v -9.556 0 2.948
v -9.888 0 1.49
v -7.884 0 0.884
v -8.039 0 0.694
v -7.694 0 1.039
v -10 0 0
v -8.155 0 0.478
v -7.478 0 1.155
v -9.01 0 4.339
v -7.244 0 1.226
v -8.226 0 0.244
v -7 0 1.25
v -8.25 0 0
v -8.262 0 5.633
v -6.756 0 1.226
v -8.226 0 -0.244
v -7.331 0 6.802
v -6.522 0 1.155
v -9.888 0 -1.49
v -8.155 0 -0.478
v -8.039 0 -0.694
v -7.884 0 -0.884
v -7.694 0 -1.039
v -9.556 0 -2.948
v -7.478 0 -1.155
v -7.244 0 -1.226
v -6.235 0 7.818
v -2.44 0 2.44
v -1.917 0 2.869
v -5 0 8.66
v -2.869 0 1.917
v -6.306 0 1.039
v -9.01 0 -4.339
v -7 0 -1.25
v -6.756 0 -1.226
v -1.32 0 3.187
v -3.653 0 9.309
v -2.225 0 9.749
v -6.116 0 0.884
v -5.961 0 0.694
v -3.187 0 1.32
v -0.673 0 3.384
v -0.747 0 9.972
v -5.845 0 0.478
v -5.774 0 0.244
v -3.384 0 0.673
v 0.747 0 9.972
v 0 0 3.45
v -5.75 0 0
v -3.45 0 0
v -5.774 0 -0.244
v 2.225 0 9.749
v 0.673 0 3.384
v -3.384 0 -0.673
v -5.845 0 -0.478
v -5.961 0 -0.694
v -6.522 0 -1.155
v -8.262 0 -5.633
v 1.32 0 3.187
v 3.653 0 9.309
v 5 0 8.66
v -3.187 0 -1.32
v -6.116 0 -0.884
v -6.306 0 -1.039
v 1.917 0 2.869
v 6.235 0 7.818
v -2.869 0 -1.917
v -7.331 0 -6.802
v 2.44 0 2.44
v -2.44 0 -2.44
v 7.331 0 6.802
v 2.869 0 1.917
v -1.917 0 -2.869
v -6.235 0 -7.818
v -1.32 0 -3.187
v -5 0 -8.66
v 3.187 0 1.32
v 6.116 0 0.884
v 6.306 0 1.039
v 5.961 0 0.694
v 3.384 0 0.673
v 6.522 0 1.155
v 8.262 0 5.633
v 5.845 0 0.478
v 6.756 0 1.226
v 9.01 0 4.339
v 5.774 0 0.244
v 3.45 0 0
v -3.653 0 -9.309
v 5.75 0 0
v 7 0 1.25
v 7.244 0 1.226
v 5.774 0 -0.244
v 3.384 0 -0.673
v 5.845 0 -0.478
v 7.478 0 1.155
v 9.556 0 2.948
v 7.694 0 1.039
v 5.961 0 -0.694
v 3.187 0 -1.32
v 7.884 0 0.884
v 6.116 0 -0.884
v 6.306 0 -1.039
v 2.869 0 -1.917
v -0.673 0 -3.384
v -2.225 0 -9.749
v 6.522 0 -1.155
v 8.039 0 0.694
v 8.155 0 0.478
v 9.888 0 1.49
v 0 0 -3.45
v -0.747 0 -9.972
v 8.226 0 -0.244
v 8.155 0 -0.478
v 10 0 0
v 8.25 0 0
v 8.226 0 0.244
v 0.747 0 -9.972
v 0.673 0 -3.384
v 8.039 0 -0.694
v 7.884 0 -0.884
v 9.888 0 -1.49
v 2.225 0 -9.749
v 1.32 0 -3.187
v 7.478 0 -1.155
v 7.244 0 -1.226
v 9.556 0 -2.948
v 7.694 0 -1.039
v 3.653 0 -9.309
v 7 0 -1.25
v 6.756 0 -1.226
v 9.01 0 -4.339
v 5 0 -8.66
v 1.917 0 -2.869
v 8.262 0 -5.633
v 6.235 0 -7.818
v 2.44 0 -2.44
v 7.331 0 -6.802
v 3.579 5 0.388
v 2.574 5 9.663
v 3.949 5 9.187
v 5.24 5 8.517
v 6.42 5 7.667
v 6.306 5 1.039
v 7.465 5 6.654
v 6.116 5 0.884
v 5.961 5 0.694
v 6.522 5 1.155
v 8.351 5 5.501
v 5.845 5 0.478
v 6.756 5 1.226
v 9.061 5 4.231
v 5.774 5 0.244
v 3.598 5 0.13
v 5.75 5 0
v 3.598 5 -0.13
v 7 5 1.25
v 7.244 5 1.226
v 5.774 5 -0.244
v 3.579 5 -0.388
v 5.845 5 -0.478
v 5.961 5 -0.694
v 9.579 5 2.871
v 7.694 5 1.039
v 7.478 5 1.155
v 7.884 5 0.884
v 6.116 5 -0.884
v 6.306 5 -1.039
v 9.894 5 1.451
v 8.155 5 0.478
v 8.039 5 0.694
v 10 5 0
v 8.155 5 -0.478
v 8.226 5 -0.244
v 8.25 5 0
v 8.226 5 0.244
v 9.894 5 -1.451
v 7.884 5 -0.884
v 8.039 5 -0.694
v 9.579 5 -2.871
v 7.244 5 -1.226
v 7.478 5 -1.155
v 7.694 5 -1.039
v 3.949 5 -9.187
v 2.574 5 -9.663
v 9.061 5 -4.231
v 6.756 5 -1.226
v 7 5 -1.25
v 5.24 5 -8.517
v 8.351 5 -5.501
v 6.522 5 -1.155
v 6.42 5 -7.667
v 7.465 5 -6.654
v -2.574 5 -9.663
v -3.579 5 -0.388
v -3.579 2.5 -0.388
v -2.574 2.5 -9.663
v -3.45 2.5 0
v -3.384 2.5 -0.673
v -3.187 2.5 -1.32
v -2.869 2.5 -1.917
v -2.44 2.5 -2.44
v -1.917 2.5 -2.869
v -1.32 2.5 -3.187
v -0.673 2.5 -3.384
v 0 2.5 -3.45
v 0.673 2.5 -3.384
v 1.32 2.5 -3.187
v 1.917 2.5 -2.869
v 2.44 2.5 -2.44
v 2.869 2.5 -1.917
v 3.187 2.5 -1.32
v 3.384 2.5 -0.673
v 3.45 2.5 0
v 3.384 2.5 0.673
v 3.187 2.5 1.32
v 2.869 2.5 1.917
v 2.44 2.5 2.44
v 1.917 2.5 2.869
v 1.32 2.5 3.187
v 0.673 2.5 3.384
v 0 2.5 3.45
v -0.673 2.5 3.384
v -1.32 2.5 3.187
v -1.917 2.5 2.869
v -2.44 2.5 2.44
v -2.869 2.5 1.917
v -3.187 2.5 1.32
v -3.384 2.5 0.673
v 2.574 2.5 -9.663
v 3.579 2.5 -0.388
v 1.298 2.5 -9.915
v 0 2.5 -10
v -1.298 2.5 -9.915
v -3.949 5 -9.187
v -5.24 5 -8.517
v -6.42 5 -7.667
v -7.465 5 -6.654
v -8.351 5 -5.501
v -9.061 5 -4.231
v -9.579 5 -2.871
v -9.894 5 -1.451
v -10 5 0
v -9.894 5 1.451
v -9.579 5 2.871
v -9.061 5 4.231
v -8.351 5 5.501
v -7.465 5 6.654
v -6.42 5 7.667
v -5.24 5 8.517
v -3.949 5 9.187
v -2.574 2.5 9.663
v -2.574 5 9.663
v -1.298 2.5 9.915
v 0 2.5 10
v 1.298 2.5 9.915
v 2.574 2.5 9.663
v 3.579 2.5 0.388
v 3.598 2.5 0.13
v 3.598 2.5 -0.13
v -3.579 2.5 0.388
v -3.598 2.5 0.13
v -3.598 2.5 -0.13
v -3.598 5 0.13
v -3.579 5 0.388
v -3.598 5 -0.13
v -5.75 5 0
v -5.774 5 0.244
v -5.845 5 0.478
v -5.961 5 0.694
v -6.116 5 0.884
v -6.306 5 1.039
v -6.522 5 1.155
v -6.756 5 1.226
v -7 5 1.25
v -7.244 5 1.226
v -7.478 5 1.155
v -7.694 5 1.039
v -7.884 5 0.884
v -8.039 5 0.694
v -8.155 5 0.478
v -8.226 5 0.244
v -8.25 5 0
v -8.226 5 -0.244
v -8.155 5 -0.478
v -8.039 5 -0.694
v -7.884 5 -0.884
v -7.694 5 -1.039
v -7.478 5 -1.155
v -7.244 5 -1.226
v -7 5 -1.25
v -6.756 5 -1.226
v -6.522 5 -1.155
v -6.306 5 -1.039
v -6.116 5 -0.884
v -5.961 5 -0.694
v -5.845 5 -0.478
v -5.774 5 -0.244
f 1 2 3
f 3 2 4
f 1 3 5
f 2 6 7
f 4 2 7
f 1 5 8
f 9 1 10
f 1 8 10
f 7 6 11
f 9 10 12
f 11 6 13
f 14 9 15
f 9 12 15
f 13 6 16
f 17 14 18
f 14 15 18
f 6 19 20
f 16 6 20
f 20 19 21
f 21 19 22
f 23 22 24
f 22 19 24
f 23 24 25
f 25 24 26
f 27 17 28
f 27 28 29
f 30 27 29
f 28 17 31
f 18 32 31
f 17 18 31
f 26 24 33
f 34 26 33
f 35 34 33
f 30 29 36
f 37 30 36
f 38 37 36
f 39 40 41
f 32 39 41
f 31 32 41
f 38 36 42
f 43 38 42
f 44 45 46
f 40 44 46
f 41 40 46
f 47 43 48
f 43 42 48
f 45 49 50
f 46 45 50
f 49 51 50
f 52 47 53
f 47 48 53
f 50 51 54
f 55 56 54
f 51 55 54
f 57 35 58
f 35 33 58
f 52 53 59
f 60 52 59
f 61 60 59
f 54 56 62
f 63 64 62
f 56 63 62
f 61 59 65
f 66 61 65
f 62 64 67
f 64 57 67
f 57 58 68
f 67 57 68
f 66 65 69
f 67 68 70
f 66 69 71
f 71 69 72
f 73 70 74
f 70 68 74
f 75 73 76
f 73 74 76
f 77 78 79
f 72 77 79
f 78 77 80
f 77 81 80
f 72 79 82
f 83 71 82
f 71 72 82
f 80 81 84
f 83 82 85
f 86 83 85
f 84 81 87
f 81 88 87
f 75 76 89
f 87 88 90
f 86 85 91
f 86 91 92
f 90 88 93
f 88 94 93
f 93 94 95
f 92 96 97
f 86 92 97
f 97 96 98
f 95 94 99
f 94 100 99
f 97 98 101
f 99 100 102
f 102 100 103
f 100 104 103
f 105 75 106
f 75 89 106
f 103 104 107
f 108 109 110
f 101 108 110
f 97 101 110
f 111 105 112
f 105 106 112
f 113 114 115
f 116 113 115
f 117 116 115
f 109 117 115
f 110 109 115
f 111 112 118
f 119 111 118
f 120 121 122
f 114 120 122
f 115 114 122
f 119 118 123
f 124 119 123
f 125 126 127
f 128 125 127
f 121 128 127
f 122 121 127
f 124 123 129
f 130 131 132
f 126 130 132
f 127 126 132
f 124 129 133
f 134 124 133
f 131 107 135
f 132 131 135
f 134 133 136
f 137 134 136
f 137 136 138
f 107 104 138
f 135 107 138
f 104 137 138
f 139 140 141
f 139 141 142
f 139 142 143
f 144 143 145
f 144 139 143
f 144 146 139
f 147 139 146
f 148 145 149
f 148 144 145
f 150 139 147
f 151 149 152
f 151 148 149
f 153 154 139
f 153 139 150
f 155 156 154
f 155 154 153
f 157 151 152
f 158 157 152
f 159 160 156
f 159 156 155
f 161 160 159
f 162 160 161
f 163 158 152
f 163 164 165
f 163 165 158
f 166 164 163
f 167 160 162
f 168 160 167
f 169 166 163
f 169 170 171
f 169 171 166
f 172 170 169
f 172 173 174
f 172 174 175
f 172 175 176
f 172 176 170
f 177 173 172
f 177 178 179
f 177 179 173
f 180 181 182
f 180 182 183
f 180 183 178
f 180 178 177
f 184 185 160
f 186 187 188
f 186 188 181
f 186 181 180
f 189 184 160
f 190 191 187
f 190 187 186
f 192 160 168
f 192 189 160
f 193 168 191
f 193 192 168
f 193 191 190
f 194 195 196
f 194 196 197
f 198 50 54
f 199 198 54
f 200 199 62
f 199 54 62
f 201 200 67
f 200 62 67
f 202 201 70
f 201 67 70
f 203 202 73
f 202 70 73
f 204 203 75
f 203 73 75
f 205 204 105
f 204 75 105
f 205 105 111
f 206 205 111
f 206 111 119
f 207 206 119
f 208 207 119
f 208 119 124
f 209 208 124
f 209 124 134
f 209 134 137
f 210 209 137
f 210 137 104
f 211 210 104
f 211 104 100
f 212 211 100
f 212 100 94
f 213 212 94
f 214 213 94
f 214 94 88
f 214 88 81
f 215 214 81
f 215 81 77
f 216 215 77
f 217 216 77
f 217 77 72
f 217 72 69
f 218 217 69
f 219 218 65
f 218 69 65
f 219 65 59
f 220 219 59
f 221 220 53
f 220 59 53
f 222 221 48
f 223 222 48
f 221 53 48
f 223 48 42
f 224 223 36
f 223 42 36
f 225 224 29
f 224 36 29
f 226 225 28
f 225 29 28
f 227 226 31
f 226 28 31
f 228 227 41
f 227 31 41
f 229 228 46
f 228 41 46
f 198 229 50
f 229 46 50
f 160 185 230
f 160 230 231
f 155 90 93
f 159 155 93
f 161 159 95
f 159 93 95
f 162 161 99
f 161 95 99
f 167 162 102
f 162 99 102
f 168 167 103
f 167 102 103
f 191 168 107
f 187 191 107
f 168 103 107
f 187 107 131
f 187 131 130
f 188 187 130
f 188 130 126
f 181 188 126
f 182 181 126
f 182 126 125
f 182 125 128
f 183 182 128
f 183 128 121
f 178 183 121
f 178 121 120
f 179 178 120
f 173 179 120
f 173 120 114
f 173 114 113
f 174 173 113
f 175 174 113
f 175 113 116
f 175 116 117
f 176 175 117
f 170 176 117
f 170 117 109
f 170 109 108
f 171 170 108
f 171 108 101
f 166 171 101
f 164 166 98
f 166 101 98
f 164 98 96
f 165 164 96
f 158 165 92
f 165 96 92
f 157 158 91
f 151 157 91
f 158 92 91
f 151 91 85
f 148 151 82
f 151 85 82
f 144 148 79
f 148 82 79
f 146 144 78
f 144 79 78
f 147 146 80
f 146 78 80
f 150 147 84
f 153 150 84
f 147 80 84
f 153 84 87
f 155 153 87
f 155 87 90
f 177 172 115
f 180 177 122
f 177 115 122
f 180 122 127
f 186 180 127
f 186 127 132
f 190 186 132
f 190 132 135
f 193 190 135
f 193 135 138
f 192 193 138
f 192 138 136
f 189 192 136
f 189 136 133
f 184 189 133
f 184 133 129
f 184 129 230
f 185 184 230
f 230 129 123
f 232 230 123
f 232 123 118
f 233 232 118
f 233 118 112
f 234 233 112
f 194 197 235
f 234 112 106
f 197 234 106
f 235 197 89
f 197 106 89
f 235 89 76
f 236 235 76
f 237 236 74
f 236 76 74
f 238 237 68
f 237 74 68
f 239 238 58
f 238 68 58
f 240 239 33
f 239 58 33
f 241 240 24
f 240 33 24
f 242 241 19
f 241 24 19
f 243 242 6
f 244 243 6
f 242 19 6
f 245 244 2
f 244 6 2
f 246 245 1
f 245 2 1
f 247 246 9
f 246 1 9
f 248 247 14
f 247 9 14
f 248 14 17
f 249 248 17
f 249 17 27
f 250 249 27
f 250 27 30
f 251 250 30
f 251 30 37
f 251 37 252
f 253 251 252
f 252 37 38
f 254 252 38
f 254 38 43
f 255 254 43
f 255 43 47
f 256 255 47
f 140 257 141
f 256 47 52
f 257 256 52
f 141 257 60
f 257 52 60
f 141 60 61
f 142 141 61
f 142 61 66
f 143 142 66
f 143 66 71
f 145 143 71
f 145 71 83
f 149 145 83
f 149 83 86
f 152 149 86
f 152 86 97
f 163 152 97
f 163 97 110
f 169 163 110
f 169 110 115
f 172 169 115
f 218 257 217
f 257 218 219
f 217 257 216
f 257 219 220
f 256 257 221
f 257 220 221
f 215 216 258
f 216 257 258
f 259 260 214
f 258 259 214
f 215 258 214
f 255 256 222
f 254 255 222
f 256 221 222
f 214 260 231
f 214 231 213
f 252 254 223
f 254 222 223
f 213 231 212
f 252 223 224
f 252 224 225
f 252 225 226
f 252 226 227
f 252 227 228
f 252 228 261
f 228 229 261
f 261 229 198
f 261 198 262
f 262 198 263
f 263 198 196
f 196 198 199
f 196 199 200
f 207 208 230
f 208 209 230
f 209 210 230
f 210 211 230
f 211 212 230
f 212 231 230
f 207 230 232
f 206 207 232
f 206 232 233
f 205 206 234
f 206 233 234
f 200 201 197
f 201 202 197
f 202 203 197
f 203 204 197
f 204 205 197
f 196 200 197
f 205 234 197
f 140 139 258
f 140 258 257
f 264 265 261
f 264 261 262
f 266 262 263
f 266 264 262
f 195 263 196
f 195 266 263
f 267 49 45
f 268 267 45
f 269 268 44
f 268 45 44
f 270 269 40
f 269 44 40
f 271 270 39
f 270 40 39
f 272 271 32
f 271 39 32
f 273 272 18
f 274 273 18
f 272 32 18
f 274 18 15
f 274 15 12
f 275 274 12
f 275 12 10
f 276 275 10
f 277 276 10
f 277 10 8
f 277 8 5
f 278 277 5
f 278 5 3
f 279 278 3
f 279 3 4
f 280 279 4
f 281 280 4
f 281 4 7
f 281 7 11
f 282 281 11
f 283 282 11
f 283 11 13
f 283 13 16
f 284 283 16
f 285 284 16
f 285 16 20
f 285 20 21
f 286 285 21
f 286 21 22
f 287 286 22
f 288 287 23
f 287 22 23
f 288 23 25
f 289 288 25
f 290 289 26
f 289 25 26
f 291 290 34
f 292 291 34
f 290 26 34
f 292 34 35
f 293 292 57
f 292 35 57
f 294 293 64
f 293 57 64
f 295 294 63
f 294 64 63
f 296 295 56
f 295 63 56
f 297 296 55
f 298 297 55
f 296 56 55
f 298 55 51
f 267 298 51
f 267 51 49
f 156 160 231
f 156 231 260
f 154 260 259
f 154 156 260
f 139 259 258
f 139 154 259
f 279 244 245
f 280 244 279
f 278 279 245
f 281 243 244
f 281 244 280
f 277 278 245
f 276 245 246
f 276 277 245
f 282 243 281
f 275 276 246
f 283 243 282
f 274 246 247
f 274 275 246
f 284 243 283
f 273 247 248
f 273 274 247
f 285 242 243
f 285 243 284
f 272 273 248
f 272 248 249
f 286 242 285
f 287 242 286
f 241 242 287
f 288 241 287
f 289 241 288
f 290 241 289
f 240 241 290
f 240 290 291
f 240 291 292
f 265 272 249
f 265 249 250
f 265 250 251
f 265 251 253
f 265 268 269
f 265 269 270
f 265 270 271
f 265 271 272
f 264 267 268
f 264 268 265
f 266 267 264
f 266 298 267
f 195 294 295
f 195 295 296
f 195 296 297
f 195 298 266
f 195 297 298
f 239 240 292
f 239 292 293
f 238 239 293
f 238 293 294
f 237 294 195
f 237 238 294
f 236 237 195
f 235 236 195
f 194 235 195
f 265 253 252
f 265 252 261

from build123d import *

# Parameters (mm, degrees)
SKETCH1_R                       = 10
BOSS_EXTRUDE1_DEPTH             = 5
TAP_DRILL_FOR_M3X0_5_TAP1_D     = 2.5
TAP_DRILL_FOR_M3X0_5_TAP1_DEPTH = 38.1
CIRPATTERN1_COUNT               = 4
F_14_0_182_DIAMETER_HOLE1_D     = 6.899999916
CUT_EXTRUDE3_DEPTH              = 2.5


with BuildPart() as part:
    # Sketch1 → Boss-Extrude1 (new body)
    with BuildSketch(Plane(origin=(0, 0, 0), x_dir=(1, 0, 0), z_dir=(0, 1, 0))):
        Circle(SKETCH1_R)
    extrude(amount=BOSS_EXTRUDE1_DEPTH)

    # Tap Drill for M3x0.5 Tap1
    with Locations(Plane(origin=(0, 5, 0), x_dir=(1, 0, 0), z_dir=(0, 1, 0))):
        with Locations((7, 0)):
            tap_drill_for_m3x0_5_tap1 = Hole(TAP_DRILL_FOR_M3X0_5_TAP1_D / 2, depth=TAP_DRILL_FOR_M3X0_5_TAP1_DEPTH)

    # CirPattern1: Tap Drill for M3x0.5 Tap1 ×4 about axis, 2 skipped
    cirpattern1_axis = Axis((0, 5, 0), (0, -1, 0))
    add([tap_drill_for_m3x0_5_tap1.rotate(cirpattern1_axis, i * 360 / CIRPATTERN1_COUNT) for i in range(1, CIRPATTERN1_COUNT) if i not in (1, 3)], mode=Mode.SUBTRACT)

    # #14 (0.182) Diameter Hole1 (through all)
    with Locations(Plane(origin=(0, 5, 0), x_dir=(1, 0, 0), z_dir=(0, 1, 0))):
        with Locations((0, 0)):
            Hole(F_14_0_182_DIAMETER_HOLE1_D / 2)

    # Sketch10 → Cut-Extrude3 (cut)
    with BuildSketch(Plane(origin=(0, 5, 0), x_dir=(1, 0, 0), z_dir=(0, 1, 0))):
        with BuildLine():
            Line((-3.57904225, 0.387887324), (-2.057949293, 14.423035211))
            ThreePointArc((-2.057949293, 14.423035211), (0, 16.27), (2.057949293, 14.423035211))
            Line((2.057949293, 14.423035211), (3.57904225, 0.387887324))
            ThreePointArc((3.57904225, 0.387887324), (3.6, 0), (3.57904225, -0.387887324))
            Line((3.57904225, -0.387887324), (2.057949293, -14.423035211))
            ThreePointArc((2.057949293, -14.423035211), (0, -16.27), (-2.057949293, -14.423035211))
            Line((-2.057949293, -14.423035211), (-3.57904225, -0.387887324))
            ThreePointArc((-3.57904225, -0.387887324), (-3.6, 0), (-3.57904225, 0.387887324))
        make_face()
    extrude(amount=-CUT_EXTRUDE3_DEPTH, mode=Mode.SUBTRACT)


solid = part.part
